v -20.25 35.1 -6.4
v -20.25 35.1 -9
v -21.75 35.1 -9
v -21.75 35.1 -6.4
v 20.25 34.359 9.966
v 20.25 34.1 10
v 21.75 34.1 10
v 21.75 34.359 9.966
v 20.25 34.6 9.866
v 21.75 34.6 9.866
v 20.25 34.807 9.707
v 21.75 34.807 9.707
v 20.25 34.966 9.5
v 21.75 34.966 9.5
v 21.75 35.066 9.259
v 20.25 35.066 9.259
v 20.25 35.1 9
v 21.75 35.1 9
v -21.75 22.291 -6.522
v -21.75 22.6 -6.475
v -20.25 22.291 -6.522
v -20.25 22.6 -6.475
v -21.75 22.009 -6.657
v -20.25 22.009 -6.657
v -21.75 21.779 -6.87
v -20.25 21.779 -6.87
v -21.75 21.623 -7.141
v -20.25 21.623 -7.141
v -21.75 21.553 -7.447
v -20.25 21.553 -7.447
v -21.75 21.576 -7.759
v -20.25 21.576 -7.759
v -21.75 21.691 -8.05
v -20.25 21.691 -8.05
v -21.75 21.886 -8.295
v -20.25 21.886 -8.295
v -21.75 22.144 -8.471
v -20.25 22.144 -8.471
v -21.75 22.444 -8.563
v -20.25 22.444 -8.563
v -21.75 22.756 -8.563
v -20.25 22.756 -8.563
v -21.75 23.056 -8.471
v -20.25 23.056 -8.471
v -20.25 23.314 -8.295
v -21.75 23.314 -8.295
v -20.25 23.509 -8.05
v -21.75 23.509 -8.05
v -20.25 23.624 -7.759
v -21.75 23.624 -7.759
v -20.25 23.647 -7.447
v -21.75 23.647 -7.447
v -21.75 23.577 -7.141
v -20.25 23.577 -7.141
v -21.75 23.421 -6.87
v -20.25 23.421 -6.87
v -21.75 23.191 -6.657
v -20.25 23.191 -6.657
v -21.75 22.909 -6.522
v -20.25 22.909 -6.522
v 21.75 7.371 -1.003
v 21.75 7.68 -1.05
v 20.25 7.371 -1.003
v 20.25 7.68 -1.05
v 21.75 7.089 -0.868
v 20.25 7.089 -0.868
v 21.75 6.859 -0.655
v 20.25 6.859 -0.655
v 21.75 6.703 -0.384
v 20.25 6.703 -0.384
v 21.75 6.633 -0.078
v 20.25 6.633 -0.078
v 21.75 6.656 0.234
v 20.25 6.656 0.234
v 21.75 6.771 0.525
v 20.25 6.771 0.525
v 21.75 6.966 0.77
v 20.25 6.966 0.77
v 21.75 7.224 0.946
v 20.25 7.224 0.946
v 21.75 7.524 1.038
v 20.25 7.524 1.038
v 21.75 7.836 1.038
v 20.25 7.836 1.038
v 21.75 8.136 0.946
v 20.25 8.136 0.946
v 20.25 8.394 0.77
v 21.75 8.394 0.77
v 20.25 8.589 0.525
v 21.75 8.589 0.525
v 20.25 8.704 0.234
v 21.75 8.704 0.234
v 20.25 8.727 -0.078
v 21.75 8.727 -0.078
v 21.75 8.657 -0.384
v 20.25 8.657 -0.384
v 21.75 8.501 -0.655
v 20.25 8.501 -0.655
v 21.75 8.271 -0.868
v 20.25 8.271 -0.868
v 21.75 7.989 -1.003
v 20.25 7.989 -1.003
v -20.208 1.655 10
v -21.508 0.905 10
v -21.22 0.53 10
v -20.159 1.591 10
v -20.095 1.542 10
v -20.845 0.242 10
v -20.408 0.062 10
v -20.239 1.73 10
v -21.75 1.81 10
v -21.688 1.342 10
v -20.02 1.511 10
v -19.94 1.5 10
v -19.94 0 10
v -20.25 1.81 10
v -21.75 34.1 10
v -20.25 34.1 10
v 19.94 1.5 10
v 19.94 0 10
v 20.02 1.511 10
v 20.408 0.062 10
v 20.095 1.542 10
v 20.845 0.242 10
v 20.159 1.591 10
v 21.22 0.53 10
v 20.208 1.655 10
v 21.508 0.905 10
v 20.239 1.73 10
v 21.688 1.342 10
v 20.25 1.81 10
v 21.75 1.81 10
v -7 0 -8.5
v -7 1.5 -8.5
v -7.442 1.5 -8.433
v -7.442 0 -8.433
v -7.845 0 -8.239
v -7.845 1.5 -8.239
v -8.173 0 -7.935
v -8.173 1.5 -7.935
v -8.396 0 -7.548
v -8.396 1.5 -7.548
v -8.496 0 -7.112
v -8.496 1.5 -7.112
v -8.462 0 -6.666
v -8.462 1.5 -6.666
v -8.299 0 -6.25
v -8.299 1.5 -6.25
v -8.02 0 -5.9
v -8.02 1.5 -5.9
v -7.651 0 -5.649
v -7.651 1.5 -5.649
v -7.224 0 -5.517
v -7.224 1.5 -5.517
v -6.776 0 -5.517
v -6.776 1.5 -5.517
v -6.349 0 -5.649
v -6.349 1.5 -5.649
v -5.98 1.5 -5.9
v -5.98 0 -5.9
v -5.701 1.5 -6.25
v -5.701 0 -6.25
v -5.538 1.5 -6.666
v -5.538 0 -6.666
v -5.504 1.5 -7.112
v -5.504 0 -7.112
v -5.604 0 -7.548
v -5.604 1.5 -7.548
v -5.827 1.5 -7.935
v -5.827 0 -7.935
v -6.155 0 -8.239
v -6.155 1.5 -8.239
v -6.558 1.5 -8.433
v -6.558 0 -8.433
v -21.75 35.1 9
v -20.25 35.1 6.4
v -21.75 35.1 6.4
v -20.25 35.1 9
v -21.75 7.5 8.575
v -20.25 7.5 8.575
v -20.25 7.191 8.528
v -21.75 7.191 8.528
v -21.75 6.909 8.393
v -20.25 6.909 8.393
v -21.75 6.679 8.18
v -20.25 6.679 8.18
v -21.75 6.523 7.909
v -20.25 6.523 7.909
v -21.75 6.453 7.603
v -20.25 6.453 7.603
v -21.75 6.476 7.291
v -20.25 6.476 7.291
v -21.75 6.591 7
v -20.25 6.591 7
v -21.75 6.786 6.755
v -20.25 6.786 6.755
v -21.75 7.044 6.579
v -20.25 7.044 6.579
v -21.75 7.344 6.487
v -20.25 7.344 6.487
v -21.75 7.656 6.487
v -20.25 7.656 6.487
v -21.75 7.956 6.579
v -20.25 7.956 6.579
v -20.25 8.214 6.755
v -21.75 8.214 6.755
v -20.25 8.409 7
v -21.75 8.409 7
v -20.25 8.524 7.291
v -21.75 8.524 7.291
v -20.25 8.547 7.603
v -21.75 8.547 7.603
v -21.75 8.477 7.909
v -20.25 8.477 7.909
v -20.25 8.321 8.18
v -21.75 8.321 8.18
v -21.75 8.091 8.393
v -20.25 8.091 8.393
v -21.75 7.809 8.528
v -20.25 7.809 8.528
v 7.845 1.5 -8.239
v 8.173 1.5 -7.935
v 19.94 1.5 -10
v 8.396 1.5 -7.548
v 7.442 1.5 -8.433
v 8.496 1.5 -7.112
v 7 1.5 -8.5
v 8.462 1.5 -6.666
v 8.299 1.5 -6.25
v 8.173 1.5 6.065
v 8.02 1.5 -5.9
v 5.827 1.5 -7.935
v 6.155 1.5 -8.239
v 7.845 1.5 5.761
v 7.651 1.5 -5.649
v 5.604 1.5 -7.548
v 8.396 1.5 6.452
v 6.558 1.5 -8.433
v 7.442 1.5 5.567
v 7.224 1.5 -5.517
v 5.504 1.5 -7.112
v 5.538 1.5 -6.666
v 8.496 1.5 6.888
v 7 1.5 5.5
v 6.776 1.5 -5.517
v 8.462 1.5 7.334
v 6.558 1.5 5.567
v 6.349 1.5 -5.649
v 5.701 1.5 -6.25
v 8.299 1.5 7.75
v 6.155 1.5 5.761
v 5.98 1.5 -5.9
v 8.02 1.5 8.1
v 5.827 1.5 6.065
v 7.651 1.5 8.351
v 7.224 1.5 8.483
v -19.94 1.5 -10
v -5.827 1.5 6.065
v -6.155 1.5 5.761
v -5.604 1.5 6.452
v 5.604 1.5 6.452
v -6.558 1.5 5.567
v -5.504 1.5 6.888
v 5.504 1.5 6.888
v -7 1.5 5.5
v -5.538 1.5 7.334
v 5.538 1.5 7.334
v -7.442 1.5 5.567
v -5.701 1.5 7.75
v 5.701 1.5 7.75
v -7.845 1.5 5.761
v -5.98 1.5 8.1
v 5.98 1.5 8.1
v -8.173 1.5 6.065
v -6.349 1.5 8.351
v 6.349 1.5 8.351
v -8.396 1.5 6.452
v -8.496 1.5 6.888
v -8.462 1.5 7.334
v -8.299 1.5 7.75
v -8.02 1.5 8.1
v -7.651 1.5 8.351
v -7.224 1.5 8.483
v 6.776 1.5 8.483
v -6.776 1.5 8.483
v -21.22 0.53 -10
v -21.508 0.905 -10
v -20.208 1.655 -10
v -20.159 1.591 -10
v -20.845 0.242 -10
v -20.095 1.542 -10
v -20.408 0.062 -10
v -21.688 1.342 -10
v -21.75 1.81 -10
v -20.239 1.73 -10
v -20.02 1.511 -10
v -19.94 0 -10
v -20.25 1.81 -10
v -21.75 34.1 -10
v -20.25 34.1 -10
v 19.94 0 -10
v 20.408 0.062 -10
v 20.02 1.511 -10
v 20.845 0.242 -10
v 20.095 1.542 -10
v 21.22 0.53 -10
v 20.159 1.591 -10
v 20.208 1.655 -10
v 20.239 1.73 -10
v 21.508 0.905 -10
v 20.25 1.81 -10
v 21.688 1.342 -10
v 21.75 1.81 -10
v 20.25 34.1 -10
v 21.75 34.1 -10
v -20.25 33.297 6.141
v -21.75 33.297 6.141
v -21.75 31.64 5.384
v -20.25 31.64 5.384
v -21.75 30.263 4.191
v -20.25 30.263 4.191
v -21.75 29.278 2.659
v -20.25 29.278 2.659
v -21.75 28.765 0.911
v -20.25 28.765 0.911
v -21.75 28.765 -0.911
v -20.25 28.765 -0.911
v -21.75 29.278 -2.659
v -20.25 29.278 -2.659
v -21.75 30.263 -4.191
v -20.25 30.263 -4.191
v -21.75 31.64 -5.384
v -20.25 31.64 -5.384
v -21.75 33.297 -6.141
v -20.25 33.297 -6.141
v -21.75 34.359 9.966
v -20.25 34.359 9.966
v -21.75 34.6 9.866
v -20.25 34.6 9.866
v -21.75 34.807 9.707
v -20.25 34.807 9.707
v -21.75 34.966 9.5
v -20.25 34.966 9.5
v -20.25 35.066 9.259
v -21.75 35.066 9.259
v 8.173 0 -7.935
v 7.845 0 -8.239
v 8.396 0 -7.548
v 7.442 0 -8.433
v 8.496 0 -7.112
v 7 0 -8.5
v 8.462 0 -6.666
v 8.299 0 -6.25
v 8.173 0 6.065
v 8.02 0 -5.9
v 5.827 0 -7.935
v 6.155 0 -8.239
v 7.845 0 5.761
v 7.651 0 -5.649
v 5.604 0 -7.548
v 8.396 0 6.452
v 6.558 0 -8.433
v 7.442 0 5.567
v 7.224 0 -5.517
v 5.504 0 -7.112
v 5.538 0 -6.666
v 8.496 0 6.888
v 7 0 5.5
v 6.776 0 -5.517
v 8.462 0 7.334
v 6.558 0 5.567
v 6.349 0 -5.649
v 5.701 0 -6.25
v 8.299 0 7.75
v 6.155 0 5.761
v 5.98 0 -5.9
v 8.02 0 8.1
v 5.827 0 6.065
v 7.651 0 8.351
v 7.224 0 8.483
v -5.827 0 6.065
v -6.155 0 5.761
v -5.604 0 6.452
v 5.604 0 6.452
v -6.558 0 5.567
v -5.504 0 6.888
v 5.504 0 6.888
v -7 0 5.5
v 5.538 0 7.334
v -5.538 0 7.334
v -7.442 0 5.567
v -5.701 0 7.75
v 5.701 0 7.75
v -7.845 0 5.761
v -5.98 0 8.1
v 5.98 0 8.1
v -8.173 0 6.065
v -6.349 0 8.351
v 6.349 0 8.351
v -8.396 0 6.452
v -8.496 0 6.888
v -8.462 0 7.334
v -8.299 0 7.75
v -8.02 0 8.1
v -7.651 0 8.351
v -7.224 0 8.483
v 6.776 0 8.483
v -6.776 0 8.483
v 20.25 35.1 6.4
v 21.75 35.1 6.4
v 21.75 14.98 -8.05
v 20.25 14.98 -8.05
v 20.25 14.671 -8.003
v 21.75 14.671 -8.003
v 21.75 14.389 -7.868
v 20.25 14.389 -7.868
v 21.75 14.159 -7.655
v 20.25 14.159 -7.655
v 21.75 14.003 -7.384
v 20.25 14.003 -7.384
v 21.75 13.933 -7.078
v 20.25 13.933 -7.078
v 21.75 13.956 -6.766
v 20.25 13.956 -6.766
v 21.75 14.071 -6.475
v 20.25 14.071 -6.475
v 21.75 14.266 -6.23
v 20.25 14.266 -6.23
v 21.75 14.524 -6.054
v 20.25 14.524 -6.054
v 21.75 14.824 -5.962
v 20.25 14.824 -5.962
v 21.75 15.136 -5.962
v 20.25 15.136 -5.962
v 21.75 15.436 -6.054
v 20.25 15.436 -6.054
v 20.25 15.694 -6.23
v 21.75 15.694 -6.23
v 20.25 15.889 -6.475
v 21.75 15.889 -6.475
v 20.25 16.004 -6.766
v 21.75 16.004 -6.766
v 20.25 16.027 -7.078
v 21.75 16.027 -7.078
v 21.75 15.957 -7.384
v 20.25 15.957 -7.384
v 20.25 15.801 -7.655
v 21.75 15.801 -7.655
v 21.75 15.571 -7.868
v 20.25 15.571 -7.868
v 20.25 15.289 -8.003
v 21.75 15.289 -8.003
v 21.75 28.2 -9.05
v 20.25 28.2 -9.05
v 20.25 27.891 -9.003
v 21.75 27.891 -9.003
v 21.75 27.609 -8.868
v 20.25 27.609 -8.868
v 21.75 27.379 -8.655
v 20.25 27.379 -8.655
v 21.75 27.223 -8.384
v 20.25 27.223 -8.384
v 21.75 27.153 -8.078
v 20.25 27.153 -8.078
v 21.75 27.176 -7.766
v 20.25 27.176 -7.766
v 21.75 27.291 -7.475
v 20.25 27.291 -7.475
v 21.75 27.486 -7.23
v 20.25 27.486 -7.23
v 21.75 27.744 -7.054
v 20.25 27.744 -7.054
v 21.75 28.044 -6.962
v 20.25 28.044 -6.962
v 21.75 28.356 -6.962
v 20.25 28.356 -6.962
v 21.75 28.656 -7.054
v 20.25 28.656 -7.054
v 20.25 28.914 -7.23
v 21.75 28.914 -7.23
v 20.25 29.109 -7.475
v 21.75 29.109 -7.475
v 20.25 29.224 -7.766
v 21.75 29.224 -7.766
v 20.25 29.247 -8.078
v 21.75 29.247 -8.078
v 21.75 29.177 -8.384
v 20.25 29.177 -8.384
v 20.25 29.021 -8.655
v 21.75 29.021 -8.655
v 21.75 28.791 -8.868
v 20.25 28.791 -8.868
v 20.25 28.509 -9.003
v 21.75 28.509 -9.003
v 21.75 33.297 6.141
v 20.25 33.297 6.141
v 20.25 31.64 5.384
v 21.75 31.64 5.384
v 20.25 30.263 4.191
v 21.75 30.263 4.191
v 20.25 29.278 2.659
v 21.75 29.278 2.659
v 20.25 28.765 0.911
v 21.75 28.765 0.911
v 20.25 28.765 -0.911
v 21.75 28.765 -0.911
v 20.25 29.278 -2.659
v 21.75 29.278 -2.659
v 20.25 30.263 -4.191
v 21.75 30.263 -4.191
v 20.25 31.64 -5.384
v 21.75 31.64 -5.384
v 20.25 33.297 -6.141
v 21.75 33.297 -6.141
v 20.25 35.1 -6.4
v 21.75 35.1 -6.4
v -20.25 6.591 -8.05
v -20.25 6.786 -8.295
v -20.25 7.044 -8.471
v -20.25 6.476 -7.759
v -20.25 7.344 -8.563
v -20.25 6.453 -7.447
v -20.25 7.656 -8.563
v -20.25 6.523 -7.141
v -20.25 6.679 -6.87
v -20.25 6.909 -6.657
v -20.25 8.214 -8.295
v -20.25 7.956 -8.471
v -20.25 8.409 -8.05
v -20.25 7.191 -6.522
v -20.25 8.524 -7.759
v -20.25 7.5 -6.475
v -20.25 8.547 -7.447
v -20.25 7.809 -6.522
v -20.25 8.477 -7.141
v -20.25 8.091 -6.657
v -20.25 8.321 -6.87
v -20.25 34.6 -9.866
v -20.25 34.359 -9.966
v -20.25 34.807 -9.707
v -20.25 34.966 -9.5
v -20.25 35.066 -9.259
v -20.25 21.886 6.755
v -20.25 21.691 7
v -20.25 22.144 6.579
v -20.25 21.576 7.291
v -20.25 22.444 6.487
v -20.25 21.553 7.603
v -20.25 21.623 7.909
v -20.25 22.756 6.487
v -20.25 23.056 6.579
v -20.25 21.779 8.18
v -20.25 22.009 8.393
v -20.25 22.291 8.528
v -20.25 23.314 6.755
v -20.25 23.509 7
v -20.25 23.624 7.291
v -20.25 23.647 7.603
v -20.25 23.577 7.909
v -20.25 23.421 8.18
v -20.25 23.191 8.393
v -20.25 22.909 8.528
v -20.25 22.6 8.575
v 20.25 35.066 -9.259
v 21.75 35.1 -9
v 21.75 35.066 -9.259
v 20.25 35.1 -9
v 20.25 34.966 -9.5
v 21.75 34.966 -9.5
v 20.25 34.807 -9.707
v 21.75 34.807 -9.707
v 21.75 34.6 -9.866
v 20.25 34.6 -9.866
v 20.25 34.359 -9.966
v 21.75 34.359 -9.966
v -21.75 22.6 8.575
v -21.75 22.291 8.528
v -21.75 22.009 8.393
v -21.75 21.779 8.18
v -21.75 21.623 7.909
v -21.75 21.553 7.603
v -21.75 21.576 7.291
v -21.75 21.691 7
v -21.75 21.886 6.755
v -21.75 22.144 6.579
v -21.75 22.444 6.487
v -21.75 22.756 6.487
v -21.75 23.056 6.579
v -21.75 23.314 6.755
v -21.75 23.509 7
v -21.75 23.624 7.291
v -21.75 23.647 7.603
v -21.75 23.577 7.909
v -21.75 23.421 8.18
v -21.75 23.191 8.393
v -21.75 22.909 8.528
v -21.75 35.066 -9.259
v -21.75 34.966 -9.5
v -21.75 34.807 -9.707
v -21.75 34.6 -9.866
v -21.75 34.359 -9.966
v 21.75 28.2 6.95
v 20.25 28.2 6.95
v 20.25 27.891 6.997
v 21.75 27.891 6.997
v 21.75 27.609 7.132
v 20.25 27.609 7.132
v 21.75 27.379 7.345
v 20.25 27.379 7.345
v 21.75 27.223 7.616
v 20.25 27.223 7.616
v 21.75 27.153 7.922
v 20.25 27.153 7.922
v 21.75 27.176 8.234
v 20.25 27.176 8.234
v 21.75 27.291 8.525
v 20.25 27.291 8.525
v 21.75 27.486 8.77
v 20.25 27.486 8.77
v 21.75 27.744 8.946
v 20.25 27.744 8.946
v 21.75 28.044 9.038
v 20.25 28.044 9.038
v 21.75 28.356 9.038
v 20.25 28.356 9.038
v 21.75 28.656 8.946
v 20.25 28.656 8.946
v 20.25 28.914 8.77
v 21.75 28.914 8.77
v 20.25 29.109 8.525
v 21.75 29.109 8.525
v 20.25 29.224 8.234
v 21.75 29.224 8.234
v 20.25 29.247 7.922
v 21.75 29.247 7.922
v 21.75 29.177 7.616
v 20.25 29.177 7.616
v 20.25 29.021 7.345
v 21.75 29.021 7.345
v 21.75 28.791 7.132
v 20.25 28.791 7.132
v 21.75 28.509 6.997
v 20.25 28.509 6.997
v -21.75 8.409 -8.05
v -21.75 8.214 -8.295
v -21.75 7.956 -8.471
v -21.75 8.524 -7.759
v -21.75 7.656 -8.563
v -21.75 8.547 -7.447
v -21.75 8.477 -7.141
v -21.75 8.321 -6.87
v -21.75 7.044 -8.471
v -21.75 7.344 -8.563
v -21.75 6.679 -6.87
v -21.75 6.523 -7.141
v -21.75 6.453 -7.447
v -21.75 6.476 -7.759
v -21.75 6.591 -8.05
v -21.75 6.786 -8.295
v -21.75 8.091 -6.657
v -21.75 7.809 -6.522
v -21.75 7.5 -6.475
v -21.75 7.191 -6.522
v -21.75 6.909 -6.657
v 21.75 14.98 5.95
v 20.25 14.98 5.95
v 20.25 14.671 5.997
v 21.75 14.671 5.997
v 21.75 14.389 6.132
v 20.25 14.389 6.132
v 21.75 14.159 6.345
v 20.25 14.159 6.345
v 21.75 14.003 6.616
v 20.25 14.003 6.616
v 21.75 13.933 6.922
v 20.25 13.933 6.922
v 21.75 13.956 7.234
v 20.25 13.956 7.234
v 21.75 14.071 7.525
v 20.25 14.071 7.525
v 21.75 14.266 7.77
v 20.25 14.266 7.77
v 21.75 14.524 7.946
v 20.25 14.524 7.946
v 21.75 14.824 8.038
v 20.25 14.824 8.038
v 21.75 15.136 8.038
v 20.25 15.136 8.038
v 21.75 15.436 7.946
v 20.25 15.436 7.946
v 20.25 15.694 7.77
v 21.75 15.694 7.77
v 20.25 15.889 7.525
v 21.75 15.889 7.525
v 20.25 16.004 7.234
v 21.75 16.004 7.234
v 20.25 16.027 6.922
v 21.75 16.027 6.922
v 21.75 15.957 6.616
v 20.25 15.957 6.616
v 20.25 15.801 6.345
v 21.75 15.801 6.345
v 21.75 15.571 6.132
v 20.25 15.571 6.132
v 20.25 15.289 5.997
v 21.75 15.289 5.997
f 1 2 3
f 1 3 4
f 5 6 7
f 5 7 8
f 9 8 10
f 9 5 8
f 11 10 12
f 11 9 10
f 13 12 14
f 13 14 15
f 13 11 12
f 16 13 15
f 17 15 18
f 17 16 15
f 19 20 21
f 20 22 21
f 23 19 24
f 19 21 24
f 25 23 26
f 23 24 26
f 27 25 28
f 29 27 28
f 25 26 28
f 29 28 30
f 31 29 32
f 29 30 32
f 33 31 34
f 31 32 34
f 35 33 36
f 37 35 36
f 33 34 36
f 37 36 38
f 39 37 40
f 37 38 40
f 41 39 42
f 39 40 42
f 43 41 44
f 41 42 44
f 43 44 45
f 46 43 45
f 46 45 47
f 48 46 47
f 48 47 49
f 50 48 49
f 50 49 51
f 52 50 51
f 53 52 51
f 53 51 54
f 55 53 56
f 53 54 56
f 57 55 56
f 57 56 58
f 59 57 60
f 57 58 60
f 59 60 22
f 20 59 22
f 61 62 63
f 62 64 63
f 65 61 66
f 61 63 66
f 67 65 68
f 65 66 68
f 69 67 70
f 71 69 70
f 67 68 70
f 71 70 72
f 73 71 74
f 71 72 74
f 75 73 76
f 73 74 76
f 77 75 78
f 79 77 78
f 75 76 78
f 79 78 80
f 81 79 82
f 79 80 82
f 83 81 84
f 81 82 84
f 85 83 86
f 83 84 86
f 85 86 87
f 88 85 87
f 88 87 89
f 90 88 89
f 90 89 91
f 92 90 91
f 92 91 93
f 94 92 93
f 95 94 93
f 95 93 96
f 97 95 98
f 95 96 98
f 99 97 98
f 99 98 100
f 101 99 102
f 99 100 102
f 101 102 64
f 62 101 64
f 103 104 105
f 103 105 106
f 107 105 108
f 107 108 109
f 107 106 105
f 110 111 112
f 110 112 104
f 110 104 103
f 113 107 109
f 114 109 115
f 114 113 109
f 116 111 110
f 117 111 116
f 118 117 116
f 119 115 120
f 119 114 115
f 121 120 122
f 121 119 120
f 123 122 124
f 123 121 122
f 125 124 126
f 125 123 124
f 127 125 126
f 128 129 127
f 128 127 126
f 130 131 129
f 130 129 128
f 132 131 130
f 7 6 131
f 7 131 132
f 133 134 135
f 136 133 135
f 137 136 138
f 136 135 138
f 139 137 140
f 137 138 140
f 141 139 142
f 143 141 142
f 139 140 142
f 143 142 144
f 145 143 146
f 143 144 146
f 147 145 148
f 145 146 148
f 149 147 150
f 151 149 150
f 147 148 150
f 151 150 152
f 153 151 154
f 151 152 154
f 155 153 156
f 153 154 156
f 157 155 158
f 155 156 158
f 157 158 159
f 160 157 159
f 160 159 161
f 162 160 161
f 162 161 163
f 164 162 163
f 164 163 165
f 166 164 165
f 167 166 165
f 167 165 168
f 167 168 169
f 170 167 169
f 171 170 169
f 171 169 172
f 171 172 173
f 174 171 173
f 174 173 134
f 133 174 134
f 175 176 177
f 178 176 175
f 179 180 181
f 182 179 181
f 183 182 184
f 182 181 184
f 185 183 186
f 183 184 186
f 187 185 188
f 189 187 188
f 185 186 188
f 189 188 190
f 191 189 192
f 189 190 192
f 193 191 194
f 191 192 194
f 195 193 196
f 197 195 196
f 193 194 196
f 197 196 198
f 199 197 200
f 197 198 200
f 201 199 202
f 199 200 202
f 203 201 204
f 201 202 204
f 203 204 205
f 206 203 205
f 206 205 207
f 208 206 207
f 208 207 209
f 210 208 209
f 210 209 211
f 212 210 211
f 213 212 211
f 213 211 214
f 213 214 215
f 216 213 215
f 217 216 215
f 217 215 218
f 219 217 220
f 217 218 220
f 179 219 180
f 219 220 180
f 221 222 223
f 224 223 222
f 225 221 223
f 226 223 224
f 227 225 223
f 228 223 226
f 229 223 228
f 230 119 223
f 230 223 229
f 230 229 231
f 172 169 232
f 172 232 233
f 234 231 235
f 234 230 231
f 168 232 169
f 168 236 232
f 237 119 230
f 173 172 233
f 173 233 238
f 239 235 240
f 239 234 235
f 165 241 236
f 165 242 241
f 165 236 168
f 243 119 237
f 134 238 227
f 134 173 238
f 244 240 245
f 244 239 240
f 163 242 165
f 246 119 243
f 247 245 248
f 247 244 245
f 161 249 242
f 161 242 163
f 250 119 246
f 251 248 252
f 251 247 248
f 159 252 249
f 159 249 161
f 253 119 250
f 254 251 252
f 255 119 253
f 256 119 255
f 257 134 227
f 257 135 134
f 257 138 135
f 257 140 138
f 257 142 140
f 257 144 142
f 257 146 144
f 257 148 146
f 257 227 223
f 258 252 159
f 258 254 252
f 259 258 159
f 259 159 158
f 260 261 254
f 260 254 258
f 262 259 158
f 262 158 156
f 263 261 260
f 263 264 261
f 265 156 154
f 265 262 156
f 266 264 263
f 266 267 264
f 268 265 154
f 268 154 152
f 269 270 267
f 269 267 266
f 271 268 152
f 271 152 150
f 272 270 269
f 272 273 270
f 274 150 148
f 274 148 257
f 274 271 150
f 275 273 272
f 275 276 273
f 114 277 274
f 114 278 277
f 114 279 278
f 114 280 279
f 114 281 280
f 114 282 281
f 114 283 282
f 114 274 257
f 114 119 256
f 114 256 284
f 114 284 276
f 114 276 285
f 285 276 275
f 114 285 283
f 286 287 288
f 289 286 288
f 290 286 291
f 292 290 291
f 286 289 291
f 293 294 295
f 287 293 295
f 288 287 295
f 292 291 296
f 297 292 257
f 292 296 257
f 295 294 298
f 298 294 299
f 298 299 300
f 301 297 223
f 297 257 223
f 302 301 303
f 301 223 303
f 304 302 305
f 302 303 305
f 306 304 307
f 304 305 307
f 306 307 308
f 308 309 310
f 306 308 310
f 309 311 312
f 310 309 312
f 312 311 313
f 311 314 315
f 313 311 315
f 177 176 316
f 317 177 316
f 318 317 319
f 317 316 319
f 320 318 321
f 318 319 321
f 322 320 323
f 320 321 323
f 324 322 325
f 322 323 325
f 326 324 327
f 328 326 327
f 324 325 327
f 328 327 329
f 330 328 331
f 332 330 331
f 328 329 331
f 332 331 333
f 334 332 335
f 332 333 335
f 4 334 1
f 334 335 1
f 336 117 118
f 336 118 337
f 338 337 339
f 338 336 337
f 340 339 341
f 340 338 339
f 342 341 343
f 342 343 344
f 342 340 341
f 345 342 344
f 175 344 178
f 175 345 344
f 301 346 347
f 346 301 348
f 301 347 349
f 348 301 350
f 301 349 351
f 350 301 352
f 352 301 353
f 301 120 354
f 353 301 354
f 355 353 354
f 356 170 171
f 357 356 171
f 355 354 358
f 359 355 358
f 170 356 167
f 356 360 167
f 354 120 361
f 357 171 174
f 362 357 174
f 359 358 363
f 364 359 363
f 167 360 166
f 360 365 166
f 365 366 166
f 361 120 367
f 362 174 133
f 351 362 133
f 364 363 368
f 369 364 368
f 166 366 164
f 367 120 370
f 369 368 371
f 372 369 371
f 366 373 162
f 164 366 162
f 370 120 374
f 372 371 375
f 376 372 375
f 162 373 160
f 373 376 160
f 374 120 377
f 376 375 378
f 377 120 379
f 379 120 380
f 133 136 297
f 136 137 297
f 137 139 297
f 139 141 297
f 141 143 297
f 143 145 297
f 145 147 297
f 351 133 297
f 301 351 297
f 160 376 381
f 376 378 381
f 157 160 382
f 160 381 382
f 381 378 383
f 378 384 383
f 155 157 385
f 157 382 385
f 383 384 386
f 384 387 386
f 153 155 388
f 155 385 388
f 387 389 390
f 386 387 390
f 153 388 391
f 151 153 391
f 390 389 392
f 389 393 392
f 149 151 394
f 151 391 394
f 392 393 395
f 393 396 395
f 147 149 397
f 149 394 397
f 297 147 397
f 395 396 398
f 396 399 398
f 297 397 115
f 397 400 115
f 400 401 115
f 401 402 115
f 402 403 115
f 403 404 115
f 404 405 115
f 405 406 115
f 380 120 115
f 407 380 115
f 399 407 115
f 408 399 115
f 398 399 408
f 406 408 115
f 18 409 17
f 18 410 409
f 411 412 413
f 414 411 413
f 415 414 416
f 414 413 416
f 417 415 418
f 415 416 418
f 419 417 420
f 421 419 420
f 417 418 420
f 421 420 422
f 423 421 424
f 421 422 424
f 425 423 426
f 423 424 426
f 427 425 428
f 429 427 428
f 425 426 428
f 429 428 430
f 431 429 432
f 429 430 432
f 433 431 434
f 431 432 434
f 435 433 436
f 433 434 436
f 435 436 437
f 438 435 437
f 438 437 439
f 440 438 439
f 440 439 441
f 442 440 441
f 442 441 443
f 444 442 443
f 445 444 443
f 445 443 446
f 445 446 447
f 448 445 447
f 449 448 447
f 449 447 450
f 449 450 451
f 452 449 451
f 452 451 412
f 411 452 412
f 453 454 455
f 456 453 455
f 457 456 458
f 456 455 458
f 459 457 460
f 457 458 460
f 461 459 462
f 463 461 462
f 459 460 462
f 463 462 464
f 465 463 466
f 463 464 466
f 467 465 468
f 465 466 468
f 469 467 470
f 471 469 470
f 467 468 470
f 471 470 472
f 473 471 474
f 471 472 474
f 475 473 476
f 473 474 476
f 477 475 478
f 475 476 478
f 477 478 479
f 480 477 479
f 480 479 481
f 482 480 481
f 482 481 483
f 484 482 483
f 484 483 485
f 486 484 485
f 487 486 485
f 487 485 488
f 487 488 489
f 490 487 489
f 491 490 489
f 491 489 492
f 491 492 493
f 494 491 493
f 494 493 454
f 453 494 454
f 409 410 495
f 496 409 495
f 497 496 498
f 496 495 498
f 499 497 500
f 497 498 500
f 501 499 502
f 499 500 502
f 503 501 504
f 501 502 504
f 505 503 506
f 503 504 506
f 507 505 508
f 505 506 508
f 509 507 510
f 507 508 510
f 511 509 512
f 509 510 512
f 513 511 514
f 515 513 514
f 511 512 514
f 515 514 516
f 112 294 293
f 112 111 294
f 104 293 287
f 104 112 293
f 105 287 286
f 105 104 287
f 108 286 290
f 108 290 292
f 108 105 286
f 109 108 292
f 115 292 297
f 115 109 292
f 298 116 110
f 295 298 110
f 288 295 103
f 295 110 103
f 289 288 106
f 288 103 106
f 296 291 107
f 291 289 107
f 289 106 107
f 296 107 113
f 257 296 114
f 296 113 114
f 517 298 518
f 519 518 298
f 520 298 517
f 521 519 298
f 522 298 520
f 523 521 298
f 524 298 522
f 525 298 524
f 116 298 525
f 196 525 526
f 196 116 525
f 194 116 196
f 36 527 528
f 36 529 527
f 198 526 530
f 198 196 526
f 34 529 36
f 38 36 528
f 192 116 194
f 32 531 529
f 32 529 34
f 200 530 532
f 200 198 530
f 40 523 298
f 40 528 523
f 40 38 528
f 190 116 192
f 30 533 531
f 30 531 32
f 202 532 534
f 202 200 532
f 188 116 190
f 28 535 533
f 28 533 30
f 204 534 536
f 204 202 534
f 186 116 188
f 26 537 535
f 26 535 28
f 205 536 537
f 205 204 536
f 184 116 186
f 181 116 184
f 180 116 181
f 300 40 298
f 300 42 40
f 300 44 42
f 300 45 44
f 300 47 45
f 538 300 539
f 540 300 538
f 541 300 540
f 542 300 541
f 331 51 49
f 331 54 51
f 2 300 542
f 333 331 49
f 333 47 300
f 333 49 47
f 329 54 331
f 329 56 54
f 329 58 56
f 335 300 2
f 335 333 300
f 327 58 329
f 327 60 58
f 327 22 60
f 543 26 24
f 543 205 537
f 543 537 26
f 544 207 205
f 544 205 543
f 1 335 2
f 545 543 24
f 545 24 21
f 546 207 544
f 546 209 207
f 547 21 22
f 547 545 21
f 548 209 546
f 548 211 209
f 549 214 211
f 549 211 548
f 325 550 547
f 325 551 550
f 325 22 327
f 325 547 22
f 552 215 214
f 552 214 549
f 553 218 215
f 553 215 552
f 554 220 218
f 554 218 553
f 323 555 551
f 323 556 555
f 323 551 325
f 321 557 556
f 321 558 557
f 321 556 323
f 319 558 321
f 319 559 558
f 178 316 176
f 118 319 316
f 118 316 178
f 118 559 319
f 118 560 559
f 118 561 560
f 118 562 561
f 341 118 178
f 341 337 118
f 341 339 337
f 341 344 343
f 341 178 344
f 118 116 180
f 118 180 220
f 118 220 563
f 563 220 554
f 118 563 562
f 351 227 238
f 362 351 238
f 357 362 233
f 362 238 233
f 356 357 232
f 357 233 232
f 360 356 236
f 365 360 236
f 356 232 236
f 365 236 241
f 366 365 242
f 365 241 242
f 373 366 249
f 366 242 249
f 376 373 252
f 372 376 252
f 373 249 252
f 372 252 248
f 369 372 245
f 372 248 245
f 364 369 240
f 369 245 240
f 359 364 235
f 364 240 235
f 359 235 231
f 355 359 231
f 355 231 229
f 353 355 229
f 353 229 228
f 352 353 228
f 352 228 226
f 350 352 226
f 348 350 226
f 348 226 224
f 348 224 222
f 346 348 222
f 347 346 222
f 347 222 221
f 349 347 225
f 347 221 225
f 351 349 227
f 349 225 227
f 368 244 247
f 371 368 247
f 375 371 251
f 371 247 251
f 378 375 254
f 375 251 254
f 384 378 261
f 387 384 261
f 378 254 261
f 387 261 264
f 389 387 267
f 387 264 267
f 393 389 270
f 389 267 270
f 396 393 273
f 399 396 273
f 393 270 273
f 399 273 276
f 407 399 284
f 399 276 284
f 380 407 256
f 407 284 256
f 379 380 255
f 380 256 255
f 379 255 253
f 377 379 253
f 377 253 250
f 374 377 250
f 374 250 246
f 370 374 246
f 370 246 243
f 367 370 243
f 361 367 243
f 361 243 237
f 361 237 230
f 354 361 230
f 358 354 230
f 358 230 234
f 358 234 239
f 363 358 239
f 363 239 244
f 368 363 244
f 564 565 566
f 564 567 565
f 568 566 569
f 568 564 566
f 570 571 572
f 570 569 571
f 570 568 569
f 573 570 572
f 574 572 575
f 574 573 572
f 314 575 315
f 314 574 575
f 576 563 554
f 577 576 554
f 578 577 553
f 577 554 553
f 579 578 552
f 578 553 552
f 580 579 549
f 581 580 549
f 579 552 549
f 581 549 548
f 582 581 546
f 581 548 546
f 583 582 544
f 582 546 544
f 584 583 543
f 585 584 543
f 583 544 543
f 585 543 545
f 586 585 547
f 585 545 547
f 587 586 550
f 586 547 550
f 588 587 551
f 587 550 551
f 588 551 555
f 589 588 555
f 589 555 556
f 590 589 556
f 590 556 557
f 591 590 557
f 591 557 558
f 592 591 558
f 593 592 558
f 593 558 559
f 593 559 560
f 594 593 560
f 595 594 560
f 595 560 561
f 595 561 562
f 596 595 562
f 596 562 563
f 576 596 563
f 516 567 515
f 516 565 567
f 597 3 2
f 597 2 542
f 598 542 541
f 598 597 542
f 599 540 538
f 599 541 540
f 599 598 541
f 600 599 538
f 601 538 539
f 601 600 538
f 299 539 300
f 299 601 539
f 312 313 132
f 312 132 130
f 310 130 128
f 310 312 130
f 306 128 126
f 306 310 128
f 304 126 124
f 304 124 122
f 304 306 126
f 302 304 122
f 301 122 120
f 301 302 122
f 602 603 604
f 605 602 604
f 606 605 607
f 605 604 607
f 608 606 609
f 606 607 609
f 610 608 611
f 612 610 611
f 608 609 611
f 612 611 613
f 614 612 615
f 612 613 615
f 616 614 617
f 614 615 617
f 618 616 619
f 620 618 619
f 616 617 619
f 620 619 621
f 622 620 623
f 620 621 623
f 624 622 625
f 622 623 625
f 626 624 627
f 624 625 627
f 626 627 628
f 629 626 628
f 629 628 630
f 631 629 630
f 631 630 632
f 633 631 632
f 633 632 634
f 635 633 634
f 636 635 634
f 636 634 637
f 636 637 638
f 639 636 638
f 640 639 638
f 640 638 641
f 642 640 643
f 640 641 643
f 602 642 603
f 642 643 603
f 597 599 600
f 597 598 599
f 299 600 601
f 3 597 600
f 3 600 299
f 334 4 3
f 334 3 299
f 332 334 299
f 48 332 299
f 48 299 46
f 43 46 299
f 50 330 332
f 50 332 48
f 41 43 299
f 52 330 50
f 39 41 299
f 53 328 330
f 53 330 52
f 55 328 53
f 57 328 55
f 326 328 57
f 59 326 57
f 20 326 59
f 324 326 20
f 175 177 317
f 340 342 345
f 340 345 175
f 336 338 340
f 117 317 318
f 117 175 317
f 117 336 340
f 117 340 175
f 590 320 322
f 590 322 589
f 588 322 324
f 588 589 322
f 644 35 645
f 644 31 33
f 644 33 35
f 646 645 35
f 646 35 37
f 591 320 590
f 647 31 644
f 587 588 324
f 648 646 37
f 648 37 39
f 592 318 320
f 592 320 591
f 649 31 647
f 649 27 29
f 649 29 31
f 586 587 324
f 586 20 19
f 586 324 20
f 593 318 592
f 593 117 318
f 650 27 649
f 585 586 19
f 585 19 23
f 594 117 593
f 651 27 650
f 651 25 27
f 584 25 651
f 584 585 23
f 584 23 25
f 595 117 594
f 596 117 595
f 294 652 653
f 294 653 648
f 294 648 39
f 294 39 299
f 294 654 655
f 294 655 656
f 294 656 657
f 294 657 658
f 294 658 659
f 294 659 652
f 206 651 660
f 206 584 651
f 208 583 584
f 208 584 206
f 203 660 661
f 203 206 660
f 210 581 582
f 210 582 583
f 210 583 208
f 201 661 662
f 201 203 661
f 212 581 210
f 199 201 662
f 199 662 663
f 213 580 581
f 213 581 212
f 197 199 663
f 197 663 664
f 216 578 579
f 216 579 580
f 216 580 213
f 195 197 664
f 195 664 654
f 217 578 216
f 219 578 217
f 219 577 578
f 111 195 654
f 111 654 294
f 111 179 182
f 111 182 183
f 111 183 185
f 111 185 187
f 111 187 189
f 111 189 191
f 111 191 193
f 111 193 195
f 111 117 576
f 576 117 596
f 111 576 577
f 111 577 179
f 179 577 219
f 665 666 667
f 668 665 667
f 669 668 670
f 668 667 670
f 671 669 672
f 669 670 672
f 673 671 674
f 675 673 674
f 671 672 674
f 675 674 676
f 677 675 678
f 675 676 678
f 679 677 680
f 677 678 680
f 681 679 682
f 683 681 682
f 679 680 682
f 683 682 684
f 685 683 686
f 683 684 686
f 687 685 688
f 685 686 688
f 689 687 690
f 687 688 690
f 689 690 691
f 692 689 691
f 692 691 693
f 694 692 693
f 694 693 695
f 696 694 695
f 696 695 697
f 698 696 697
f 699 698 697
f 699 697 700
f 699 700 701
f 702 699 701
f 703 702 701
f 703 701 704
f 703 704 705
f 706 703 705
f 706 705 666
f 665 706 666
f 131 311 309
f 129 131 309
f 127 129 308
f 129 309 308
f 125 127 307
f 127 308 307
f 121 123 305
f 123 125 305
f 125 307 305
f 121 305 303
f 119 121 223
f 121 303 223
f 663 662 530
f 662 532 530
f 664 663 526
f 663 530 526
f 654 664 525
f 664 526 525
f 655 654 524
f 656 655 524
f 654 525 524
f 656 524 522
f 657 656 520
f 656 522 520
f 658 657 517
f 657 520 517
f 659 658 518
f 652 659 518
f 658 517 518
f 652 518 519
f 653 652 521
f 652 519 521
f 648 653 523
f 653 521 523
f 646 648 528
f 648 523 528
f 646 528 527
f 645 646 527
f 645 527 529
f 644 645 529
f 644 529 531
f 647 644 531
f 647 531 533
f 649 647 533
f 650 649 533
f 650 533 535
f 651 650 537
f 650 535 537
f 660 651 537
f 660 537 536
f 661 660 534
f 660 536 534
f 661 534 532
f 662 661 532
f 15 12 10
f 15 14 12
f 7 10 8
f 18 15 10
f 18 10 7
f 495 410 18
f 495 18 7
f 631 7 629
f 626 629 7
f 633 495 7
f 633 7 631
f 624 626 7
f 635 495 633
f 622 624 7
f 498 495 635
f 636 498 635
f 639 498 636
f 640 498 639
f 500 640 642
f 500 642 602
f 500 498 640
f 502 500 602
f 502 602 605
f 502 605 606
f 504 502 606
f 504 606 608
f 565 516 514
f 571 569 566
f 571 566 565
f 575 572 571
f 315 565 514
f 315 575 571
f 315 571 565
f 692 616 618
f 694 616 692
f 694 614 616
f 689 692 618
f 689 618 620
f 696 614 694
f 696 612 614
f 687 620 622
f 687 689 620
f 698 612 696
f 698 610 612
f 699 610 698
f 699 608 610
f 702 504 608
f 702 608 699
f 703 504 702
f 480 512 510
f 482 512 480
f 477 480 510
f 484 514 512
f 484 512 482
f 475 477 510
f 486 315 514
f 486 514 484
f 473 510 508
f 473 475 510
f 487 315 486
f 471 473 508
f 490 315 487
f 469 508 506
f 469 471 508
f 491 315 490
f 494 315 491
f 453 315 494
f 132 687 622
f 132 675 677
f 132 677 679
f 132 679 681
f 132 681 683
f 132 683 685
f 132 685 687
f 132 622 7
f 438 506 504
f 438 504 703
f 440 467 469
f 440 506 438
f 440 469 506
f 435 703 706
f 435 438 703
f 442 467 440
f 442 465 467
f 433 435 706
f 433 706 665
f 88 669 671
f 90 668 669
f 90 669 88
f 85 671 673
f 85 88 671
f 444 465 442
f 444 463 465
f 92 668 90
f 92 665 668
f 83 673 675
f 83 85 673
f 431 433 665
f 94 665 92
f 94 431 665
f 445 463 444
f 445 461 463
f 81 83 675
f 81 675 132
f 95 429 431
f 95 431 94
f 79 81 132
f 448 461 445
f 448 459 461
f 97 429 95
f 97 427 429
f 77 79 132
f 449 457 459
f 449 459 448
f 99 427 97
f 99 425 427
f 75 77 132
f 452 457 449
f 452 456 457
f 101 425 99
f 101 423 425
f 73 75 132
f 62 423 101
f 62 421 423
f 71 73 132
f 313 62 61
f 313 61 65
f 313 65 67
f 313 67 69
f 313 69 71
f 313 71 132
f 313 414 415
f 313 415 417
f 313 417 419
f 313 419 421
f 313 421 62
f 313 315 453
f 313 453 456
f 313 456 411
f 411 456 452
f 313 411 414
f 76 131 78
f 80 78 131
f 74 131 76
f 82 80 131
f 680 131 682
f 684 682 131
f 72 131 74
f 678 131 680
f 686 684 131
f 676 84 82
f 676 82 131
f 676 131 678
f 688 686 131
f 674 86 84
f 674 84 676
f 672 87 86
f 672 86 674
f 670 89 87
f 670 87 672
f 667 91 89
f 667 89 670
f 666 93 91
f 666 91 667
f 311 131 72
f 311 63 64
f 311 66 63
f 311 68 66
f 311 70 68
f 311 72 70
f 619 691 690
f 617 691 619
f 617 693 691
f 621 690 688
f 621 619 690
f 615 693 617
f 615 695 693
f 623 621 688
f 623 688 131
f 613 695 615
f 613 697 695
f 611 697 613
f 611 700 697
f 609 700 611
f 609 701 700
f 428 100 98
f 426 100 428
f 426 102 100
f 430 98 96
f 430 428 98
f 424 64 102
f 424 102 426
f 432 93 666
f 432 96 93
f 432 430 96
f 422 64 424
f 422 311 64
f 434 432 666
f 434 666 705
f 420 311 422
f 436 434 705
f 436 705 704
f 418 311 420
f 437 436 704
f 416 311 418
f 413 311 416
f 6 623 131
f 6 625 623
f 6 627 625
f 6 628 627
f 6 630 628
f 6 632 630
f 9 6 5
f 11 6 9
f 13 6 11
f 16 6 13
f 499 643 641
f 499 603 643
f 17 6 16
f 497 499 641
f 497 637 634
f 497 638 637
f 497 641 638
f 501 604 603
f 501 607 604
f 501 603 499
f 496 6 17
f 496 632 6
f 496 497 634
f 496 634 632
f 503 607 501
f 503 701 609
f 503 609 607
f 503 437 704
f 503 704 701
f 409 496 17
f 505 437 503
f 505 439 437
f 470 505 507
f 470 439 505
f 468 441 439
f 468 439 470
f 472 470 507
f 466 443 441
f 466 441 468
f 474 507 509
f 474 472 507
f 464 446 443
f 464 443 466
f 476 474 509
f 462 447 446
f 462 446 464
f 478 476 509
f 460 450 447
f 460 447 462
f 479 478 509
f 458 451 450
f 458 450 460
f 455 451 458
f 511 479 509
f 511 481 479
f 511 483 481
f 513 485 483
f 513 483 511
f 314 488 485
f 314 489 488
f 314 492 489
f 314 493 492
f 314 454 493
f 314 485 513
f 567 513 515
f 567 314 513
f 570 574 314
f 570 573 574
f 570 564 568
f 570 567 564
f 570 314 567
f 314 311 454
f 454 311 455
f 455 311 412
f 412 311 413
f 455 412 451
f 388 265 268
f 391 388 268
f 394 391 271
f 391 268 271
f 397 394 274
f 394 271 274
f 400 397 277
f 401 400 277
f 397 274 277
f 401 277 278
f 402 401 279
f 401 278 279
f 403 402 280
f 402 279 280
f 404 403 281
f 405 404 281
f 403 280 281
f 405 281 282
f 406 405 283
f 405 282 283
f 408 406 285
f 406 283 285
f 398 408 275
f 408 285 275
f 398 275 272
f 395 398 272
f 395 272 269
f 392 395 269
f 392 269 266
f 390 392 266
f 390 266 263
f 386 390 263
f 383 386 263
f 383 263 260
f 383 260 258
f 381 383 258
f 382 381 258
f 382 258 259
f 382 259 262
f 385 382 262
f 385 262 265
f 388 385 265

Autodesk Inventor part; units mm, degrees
ref_plane "YZ Plane" through (0, 0, 0) normal (1, 0, 0) x (0, 1, 0)
ref_plane "XZ Plane" through (0, 0, 0) normal (0, 1, 0) x (-1, 0, 0)
ref_plane "XY Plane" through (0, 0, 0) normal (0, 0, 1) x (1, 0, 0)
sketch "Sketch1" plane through (0, 0, 0) normal (0, 1, 0) x (-1, 0, 0)
  line L0 (20.25, -10) -> (-20.25, -10)
  line L1 (-20.25, -10) -> (-20.25, 10)
  line L2 (-20.25, 10) -> (20.25, 10)
  line L3 (20.25, 10) -> (20.25, -10)
  point P0 (0, 0)
  dimension "d0" = 40.5
  dimension "d1" = 20
  dimension "d2" = 10
  dimension "d3" = 20.25
extrude "Plate1" add sketch "Sketch1" along normal blind 1.5
sketch "Sketch2" plane through (21.75, 0, -10) normal (-1, 0, 0) x (0, -1, 0)
  line L0 (0, 20) -> (0, 0)
  line L1 (0, 0) -> (-45, 0)
  line L2 (-45, 0) -> (-45, 20)
  line L3 (-45, 20) -> (0, 20)
edge flange "Flange1" height 45 angle 90 thickness 1.5 bend radius 0.31 thickness toward (-1, 0, 0) relief tear relief width 1.5 relief depth 0.75 edges at (20.25, 1.5, 0) wall of the first edge with corners at (21.75, 0, 10) (21.75, 0, -10) (21.75, 45, -10) (21.75, 45, 10)
bend "Bend1"
corner "Corner1"
sketch "Sketch3" plane through (-21.75, 0, 10) normal (1, 0, 0) x (0, 1, 0)
  line L0 (0, -20) -> (0, 0)
  line L1 (0, 0) -> (45, 0)
  line L2 (45, 0) -> (45, -20)
  line L3 (45, -20) -> (0, -20)
edge flange "Flange2" height 45 angle 90 thickness 1.5 bend radius 0.31 thickness toward (1, 0, 0) relief tear relief width 1.5 relief depth 0.75 edges at (-20.25, 1.5, 0) wall of the first edge with corners at (-21.75, 0, -10) (-21.75, 0, 10) (-21.75, 45, 10) (-21.75, 45, -10)
bend "Bend2"
corner "Corner2"
sketch "Sketch4" plane through (21.75, 45, 10) normal (1, 0, 0) x (0, 0, -1)
  circle A0 centre (10, -9.9) radius 6.4
  line L0 (0, 0) -> (20, 0) projected
  line L1 (20, 0) -> (20, -43.19) projected
  point P0 (10, -45)
  dimension "d25" = 9.9
  dimension "d26" = 12.8
  dimension "d27" = 10
extrude "Extrusion1" cut sketch "Sketch4" against normal blind 50
sketch "Sketch5" plane through (21.75, 45, 10) normal (1, 0, 0) x (0, 0, -1)
  circle A0 centre (10, -9.9) radius 6.4 projected
  line L0 (0, 0) -> (20, 0) projected
  line L1 (-4, 0) -> (24, 0)
  line L2 (24, 0) -> (24, -9.9)
  line L3 (24, -9.9) -> (-4, -9.9)
  line L4 (-4, -9.9) -> (-4, 0)
  line L5 (0, -43.19) -> (0, 0) projected
  point P0 (10, -45)
  dimension "d30" = 9.9
  dimension "d31" = 28
  dimension "d32" = 4
extrude "Extrusion2" cut sketch "Sketch5" against normal blind 50 contours L3 A0 | A0 L3 L5 L0 L1 L2 | L3 L4 L1 L5 picked at (9.2435, -7.9053)
fillet "Fillet1" radius 1 4 edges at (-21, 35.1, 10) (-21, 35.1, -10) (21, 35.1, -10) (21, 35.1, 10)
sketch "Sketch8" plane through (0, 0, 0) normal (0, -1, 0) x (1, 0, 0)
  circle A0 centre (8, -8) radius 1.05 projected
  circle A1 centre (-8, -8) radius 1.05 projected
  circle A2 centre (8, 8) radius 1.05 projected
  circle A3 centre (-8, 8) radius 1.05 projected
  circle A4 centre (-7, -7) radius 1.5
  line L0 (-9.33, -10.07) -> (7.53, -10.07)
  line L1 (10.07, -8.5) -> (10.07, 29.6)
  circle A5 centre (7, -7) radius 1.5
  circle A6 centre (-7, 7) radius 1.5
  circle A7 centre (7, 7) radius 1.5
  point P0 (0, 0)
  dimension "d71" = 7
  dimension "d72" = 7
  dimension "d73" = 3
  dimension "d76" = 14
  dimension "d79" = 14
hole "Hole3" at (-7, 0, -7) at (-7, 0, 7) at (7, 0, 7) at (7, 0, -7) direction (0, 1, 0) diameter 3 depth 1.5
sketch "Sketch9" plane through (-21.75, 1.81, -10) normal (-1, 0, 0) x (0, 0, 1)
  circle A0 centre (17.525, 20.79) radius 0.7835 projected
  circle A1 centre (17.525, 5.69) radius 0.7835 projected
  circle A2 centre (2.475, 20.79) radius 0.7835 projected
  circle A3 centre (2.475, 5.69) radius 0.7835 projected
  point P0 (10, -1.81)
hole "Hole4" at (-21.75, 7.5, 7.525) at (-21.75, 7.5, -7.525) at (-21.75, 22.6, -7.525) at (-21.75, 22.6, 7.525) direction (1, 0, 0) diameter 2.1 depth 1.5
sketch "Sketch10" plane through (21.75, 1.81, 10) normal (1, 0, 0) x (0, 0, -1)
  circle A0 centre (3, 13.17) radius 0.7835 projected
  circle A1 centre (10, 5.87) radius 0.7835 projected
  circle A2 centre (17, 13.17) radius 0.7835 projected
  circle A3 centre (2, 26.39) radius 0.7835 projected
  circle A4 centre (18, 26.39) radius 0.7835 projected
  point P0 (10, -1.81)
hole "Hole5" at (21.75, 28.2, 8) at (21.75, 28.2, -8) at (21.75, 14.98, -7) at (21.75, 7.68, 0) at (21.75, 14.98, 7) direction (-1, 0, 0) diameter 2.1 depth 1.5
equation "\"d55\" = Thickness"
equation "\"d62\" = Thickness"
equation "\"d69\" = Thickness"
equation "\"d4\" = Thickness"
equation "\"d5\" = BendReliefWidth"
equation "\"d6\" = BendReliefDepth"
equation "\"d7\" = MinimumRemnant"
equation "\"d8\" = TransitionRadius"
equation "\"d11\" = BendRadius"
equation "\"d12\" = CornerReliefSize"
equation "\"d13\" = GapSize"
equation "\"d14\" = JacobiRadiusSize"
equation "\"d15\" = BendReliefWidth"
equation "\"d16\" = BendReliefDepth"
equation "\"d17\" = MinimumRemnant"
equation "\"d18\" = TransitionRadius"
equation "\"d21\" = BendRadius"
equation "\"d22\" = CornerReliefSize"
equation "\"d23\" = GapSize"
equation "\"d24\" = JacobiRadiusSize"
equation "\"BendReliefWidth\" = Thickness"
equation "\"BendReliefDepth\" = 0.5 * Thickness"
equation "\"CornerReliefSize\" = 4 * Thickness"
equation "\"MinimumRemnant\" = 2 * Thickness"
equation "\"TransitionRadius\" = BendRadius"
equation "\"JacobiRadiusSize\" = BendRadius"
equation "\"GapSize\" = Thickness"
equation "\"Thickness\" = 1.5"
equation "\"BendRadius\" = 0.31"
properties part number "axis_10_top_frame" material "Aluminum 6061-AHC"
